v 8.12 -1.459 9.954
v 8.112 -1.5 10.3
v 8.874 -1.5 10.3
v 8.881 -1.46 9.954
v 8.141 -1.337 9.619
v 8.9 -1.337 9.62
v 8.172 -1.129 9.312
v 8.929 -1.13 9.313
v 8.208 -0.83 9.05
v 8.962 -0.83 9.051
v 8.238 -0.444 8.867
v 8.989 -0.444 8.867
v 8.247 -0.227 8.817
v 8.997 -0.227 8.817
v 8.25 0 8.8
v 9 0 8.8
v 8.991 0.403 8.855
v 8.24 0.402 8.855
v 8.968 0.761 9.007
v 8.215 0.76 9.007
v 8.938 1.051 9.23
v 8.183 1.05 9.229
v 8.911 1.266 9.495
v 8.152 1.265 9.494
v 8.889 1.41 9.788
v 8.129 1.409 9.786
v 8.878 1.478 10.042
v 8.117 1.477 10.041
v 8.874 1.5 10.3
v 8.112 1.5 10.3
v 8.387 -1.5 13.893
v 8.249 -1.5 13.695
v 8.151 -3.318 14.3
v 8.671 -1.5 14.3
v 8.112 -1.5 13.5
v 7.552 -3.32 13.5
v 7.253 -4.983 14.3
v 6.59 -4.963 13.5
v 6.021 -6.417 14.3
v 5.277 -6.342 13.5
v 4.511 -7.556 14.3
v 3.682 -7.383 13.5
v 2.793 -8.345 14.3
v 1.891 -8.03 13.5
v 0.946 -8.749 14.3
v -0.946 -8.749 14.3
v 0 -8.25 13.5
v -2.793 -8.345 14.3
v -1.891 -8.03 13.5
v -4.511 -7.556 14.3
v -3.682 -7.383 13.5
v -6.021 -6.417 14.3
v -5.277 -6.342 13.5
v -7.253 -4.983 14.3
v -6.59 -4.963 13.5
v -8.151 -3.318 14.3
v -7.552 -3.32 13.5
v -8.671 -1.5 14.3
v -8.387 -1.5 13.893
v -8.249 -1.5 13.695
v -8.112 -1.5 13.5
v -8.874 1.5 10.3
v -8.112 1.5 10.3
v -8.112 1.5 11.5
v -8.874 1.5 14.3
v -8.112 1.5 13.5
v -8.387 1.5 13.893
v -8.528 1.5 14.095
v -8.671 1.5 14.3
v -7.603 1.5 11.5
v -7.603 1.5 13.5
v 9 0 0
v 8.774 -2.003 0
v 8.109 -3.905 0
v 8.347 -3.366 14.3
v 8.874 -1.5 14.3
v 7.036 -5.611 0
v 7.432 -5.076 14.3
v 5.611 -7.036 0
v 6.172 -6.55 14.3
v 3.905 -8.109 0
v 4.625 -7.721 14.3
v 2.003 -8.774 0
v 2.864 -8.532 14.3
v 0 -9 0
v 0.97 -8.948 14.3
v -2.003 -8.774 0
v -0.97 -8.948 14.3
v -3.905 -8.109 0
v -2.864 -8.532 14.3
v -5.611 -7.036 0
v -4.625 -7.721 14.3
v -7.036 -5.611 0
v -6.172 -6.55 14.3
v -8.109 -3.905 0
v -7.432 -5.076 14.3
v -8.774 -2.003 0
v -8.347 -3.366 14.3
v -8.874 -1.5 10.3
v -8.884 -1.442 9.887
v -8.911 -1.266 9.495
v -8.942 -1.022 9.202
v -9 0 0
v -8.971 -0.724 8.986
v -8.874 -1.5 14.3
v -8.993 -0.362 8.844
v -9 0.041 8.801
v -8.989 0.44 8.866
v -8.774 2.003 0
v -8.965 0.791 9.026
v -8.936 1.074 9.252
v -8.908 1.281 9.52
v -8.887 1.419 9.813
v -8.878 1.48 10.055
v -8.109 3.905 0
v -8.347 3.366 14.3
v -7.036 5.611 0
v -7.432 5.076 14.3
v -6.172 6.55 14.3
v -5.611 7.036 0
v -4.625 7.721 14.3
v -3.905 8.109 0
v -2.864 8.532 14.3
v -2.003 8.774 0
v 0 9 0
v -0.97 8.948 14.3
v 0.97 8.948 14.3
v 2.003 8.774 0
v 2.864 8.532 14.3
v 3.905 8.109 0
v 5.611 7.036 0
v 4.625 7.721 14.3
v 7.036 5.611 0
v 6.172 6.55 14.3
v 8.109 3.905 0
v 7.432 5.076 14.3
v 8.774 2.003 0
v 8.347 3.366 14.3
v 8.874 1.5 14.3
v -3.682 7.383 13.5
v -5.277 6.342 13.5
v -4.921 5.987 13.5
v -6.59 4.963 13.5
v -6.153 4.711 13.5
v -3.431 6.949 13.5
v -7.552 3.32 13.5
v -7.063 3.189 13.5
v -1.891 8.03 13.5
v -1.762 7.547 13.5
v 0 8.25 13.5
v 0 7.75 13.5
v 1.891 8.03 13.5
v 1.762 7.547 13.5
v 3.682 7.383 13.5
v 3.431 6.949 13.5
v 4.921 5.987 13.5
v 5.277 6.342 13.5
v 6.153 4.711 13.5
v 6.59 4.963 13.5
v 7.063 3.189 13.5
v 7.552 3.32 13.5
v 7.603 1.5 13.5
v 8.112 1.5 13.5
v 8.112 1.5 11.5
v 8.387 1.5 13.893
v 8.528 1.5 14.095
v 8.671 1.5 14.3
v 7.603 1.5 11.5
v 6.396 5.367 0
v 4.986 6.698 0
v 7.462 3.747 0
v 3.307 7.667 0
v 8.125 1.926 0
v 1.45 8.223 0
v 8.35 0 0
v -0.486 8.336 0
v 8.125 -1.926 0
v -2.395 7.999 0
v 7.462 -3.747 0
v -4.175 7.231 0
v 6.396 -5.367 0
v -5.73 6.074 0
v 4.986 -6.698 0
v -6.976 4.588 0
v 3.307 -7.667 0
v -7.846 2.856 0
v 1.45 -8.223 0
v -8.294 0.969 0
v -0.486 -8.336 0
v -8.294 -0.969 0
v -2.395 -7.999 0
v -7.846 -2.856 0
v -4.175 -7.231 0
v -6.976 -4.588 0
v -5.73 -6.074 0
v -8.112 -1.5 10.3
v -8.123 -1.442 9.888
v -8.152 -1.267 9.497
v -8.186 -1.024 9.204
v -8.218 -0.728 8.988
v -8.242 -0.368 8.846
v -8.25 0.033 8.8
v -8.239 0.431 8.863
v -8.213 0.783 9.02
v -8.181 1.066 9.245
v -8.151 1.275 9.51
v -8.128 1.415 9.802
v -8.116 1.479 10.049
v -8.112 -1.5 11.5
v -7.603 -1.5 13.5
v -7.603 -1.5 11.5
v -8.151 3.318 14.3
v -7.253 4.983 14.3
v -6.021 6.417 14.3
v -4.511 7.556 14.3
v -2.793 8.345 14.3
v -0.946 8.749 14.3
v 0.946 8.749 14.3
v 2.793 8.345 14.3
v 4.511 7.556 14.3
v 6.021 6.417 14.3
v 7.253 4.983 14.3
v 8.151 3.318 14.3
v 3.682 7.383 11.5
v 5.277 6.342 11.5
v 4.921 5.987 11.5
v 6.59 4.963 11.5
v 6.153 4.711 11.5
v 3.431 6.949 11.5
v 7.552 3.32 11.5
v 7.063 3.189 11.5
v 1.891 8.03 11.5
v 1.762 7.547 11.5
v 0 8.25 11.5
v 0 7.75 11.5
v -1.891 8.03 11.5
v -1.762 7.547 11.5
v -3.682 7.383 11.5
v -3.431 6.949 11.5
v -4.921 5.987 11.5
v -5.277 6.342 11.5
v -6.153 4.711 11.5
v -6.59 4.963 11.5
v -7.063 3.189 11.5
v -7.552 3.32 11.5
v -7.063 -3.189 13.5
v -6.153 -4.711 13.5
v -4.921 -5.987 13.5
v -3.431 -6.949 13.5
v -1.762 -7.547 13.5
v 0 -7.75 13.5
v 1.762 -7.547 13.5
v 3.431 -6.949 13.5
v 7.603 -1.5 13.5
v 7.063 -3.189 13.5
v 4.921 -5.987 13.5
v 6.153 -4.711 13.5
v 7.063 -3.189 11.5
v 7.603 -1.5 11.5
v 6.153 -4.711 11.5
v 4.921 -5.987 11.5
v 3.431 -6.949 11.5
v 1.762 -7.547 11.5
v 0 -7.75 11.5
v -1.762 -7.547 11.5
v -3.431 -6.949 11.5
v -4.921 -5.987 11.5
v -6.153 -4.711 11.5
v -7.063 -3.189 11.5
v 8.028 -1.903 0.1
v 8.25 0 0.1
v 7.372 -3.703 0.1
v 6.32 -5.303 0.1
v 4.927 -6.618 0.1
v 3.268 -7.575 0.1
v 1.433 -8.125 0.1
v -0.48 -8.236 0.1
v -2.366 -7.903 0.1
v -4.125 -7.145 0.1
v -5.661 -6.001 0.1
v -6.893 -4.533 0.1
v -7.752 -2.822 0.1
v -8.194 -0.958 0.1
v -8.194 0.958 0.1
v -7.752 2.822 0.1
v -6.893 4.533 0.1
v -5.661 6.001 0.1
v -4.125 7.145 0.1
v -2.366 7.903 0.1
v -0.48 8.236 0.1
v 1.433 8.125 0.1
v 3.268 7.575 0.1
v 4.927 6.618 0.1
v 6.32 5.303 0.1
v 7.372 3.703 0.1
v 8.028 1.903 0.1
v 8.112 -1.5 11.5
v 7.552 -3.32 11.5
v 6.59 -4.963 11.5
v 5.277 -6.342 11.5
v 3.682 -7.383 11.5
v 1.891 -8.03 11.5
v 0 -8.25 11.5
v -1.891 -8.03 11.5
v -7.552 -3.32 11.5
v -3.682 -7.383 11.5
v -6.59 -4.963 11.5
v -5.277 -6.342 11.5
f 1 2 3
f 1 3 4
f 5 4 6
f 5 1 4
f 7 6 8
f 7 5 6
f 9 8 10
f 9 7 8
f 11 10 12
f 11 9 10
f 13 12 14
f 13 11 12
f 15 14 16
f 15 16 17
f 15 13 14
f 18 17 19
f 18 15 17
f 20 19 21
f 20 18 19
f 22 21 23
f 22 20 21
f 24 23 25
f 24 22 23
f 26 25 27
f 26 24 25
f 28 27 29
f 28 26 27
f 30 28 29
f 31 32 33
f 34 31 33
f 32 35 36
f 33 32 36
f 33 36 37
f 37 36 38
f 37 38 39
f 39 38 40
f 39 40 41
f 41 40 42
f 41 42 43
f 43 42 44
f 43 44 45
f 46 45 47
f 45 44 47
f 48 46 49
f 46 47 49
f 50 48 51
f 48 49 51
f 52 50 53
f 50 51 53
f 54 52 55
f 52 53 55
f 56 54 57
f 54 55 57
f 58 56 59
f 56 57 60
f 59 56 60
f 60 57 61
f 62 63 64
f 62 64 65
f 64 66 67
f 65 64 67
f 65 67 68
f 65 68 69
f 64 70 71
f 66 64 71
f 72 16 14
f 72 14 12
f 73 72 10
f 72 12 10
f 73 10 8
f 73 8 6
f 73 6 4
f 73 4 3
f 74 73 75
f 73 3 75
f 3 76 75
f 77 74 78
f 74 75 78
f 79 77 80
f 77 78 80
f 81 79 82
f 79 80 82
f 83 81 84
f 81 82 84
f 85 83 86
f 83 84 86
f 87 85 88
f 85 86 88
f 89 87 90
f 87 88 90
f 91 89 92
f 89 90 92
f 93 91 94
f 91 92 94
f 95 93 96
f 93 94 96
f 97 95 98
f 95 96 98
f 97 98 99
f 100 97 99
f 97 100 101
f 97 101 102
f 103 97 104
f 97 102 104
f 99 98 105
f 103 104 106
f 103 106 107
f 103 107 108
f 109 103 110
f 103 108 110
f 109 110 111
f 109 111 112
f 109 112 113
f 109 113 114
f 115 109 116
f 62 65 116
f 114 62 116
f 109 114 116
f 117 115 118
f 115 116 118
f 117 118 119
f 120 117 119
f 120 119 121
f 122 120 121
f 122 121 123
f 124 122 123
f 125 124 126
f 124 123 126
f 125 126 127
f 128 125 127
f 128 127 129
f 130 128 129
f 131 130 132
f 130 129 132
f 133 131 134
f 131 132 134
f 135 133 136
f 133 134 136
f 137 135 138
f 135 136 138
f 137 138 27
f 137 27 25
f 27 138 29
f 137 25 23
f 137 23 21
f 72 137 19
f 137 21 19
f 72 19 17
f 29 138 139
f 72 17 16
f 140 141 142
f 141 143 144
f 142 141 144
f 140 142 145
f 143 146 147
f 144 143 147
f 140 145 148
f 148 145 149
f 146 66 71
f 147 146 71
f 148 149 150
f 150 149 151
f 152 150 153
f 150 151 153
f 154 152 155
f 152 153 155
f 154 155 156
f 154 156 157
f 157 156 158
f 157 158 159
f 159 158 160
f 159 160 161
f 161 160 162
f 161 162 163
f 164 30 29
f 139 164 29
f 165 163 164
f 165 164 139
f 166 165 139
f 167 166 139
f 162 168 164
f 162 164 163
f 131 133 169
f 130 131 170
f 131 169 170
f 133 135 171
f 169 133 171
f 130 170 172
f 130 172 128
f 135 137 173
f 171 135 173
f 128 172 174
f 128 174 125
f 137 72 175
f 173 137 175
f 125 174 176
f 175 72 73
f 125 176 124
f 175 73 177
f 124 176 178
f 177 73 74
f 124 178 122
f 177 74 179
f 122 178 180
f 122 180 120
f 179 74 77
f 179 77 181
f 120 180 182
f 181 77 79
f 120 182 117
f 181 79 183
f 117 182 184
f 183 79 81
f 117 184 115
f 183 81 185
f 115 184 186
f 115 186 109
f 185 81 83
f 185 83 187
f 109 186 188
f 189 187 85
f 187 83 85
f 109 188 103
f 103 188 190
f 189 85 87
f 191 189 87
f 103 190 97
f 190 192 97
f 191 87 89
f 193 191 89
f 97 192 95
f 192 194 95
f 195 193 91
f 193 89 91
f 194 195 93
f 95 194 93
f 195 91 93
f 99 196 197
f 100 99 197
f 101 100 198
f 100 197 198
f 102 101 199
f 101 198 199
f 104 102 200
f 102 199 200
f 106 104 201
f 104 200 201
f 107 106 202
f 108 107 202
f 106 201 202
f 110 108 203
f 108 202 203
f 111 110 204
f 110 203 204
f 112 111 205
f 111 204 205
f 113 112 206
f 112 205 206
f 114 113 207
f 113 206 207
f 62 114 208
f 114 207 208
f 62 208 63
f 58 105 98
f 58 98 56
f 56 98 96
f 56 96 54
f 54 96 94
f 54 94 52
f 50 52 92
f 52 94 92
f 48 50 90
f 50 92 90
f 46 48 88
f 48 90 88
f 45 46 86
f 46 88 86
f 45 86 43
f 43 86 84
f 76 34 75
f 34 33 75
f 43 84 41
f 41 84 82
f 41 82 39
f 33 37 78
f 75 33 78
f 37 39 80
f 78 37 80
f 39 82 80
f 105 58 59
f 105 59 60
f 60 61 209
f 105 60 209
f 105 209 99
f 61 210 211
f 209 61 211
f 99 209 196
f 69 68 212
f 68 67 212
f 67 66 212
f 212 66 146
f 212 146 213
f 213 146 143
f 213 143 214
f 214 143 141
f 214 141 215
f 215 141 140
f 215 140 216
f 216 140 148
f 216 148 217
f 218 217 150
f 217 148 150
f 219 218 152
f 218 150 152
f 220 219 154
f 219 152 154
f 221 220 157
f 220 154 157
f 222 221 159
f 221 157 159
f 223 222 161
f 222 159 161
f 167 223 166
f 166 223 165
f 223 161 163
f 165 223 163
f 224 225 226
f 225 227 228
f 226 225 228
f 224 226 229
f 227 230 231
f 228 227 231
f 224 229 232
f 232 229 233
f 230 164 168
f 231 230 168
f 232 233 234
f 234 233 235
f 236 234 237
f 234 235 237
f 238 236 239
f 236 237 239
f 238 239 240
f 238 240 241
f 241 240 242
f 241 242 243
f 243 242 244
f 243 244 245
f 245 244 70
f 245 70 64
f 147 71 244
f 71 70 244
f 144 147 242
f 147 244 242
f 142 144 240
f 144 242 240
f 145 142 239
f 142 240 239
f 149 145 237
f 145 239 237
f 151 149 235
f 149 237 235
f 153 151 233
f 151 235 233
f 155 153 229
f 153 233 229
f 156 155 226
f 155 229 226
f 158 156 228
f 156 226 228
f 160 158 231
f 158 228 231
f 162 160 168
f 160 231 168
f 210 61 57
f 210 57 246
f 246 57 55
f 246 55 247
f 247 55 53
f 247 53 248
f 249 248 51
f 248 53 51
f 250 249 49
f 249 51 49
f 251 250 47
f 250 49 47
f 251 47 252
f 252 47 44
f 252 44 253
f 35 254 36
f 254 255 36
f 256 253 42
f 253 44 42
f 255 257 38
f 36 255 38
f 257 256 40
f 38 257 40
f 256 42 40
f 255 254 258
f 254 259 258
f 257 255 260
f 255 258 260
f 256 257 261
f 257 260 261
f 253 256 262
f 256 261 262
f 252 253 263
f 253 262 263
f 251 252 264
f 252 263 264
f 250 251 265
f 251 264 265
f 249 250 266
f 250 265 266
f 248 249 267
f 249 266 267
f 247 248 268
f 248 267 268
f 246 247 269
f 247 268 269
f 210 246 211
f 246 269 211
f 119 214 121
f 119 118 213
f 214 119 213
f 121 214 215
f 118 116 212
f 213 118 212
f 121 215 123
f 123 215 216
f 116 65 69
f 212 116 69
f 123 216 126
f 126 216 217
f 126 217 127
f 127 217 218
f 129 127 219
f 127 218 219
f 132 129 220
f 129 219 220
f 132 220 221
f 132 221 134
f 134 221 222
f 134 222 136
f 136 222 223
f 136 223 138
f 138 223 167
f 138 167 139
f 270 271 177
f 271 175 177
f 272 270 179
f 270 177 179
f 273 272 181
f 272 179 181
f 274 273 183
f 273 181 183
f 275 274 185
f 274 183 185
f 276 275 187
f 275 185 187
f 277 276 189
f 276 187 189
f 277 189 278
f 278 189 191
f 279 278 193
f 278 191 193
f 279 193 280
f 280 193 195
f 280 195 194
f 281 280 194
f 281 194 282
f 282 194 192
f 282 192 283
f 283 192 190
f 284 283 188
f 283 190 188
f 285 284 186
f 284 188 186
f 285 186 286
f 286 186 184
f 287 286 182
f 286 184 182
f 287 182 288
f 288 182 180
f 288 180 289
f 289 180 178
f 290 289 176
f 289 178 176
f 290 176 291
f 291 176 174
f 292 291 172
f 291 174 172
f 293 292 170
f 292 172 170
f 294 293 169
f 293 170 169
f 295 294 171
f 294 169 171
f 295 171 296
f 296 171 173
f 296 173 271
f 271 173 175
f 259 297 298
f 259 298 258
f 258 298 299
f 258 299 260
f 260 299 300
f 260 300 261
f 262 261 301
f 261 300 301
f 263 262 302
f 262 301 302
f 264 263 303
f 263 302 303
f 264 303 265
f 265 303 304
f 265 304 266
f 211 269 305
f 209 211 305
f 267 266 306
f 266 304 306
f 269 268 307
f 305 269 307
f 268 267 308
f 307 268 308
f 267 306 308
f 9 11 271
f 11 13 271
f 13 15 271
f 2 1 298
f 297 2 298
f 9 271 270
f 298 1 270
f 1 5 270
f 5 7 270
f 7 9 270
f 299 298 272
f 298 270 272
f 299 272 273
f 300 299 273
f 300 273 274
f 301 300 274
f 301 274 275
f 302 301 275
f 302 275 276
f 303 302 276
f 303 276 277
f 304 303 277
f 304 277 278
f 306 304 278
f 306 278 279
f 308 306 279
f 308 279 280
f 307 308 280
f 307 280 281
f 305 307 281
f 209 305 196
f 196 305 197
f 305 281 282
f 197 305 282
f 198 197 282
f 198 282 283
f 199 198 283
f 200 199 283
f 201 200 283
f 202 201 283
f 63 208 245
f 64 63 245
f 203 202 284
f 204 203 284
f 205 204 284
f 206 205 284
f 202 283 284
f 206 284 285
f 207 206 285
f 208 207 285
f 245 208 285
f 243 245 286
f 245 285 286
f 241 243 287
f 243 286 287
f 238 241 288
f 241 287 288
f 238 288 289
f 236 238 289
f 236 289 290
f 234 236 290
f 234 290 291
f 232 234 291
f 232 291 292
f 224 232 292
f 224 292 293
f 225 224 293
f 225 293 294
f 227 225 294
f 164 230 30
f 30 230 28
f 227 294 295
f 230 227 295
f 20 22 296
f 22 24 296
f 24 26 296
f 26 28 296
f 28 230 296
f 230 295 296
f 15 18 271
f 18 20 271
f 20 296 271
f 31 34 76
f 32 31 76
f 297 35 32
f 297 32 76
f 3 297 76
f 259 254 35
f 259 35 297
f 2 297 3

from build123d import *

# Parameters (mm, degrees)
F3_DEPTH      = 9.001
F3_DEPTH_BACK = 25


with BuildPart() as f1:
    # F0 (on Front) → F1 (revolve)
    with BuildSketch(Plane.XZ):
        Polygon((8.25, 11.5), (8.25, 0.1), (8.35, 0), (9, 0), (9, 14.3), (8.8, 14.3), (8.25, 13.5), (7.75, 13.5), (7.75, 11.5), align=None)
    revolve(axis=Axis((0, 0, 7.15), (0, 0, -1)))

    # F2 (on Right) → F3 (cut, two sides)
    with BuildSketch(Plane.YZ) as f3_sk:
        with BuildLine():
            Line((-1.5, 14.3), (-1.5, 10.3))
            ThreePointArc((-1.5, 10.3), (0, 8.8), (1.5, 10.3))
            Line((1.5, 10.3), (1.5, 14.3))
            Line((1.5, 14.3), (-1.5, 14.3))
        make_face()
    extrude(amount=-F3_DEPTH, mode=Mode.SUBTRACT)
    extrude(f3_sk.sketch, amount=F3_DEPTH_BACK, mode=Mode.SUBTRACT)


solid = f1.part
